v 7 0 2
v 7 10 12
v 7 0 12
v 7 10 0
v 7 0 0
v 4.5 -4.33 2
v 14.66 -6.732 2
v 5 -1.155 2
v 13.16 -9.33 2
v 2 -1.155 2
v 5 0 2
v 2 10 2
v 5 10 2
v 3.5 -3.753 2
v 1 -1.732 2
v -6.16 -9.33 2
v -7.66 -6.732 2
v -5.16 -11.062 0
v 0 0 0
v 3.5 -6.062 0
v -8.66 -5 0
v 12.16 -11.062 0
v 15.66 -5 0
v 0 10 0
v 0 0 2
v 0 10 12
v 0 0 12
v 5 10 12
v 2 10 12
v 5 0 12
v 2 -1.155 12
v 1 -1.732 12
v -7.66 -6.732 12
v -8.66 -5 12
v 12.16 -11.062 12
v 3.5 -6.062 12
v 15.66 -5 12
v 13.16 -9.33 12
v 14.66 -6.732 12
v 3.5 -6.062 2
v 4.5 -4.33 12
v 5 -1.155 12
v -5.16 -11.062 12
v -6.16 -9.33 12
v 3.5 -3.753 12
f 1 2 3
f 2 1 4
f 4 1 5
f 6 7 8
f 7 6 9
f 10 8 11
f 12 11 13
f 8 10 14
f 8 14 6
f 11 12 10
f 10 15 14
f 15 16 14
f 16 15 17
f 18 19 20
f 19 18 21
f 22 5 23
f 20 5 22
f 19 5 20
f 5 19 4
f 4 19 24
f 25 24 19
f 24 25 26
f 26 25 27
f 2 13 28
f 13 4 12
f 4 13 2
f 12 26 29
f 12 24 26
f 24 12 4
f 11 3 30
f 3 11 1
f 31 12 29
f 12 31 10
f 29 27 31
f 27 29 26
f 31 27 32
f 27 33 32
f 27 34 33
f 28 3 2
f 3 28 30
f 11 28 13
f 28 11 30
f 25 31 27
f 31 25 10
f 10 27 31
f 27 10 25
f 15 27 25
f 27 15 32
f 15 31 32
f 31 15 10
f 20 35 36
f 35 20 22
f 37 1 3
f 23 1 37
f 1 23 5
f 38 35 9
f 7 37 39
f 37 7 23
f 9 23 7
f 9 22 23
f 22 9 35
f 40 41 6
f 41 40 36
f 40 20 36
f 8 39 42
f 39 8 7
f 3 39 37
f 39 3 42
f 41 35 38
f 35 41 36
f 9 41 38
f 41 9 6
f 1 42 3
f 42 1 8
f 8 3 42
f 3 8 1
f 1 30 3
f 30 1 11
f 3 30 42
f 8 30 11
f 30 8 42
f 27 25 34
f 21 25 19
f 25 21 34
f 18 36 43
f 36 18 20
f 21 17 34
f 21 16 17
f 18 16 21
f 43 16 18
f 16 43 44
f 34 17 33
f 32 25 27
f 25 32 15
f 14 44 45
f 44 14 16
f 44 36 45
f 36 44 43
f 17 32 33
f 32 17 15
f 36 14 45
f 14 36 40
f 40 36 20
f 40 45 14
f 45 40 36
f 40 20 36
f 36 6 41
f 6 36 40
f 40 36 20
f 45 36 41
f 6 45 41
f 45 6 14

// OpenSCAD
// file: joint_commons.scad
module arm(gapThickness, wallThickness, wallHeight, bottomThickness, armLength)
{
    // Bottom
    cube([gapThickness + (2 * wallThickness), armLength, bottomThickness]);
    // Walls
    translate([0, 0, bottomThickness])
        cube([wallThickness, armLength, wallHeight]);
    translate([wallThickness+gapThickness, 0, bottomThickness])
        cube([wallThickness, armLength, wallHeight]);
}

module wedge(wedgeFlatEdge, wedgeExtrusion)
{
    union()
    {
        linear_extrude(height=wedgeExtrusion)
            polygon(points=[[0,0], [0,wedgeFlatEdge], [wedgeFlatEdge/sqrt(3), wedgeFlatEdge]]);
        linear_extrude(height=wedgeExtrusion)
            rotate([0,180,-60])
            polygon(points=[[0,0], [0,wedgeFlatEdge], [wedgeFlatEdge/sqrt(3), wedgeFlatEdge]]);
    }
}
// main file
include <joint_commons.scad>;

module armWithWedge(gapThickness, wallThickness, wallHeight, bottomThickness, armLength)
{
    union()
    {
        arm(gapThickness, wallThickness, wallHeight, bottomThickness, armLength);
        rotate([0,0,-90]) wedge(wallThickness, bottomThickness+wallHeight);
    }
}

module tripleJoint(gapThickness, wallThickness, wallHeight, bottomThickness, armLength) {
        // Construct arms
        armWithWedge(gapThickness, wallThickness, wallHeight, bottomThickness, armLength);
        translate([(2*wallThickness)+gapThickness, 0, 0])
            rotate([0,0,-120])
            {
                armWithWedge(gapThickness, wallThickness, wallHeight, bottomThickness, armLength);
                translate([(2*wallThickness)+gapThickness, 0, 0])
                    rotate([0,0,-120])
                    armWithWedge(gapThickness, wallThickness, wallHeight, bottomThickness, armLength);
            }
        // Construct bottom centre
        hull()
        {
            wedge(wallThickness, bottomThickness);
            translate([(2*wallThickness)+gapThickness, 0, 0])
                rotate([0,0,-120])
                {
                    wedge(wallThickness, bottomThickness);
                    translate([(2*wallThickness)+gapThickness, 0, 0])
                        rotate([0,0,-120])
                        wedge(wallThickness, bottomThickness);
                }
        }
}

gapThickness = 3;
wallThickness = 2;
wallHeight = 10;
bottomThickness = 2;
armLength = 10;

tripleJoint(gapThickness, wallThickness, wallHeight, bottomThickness, armLength);
